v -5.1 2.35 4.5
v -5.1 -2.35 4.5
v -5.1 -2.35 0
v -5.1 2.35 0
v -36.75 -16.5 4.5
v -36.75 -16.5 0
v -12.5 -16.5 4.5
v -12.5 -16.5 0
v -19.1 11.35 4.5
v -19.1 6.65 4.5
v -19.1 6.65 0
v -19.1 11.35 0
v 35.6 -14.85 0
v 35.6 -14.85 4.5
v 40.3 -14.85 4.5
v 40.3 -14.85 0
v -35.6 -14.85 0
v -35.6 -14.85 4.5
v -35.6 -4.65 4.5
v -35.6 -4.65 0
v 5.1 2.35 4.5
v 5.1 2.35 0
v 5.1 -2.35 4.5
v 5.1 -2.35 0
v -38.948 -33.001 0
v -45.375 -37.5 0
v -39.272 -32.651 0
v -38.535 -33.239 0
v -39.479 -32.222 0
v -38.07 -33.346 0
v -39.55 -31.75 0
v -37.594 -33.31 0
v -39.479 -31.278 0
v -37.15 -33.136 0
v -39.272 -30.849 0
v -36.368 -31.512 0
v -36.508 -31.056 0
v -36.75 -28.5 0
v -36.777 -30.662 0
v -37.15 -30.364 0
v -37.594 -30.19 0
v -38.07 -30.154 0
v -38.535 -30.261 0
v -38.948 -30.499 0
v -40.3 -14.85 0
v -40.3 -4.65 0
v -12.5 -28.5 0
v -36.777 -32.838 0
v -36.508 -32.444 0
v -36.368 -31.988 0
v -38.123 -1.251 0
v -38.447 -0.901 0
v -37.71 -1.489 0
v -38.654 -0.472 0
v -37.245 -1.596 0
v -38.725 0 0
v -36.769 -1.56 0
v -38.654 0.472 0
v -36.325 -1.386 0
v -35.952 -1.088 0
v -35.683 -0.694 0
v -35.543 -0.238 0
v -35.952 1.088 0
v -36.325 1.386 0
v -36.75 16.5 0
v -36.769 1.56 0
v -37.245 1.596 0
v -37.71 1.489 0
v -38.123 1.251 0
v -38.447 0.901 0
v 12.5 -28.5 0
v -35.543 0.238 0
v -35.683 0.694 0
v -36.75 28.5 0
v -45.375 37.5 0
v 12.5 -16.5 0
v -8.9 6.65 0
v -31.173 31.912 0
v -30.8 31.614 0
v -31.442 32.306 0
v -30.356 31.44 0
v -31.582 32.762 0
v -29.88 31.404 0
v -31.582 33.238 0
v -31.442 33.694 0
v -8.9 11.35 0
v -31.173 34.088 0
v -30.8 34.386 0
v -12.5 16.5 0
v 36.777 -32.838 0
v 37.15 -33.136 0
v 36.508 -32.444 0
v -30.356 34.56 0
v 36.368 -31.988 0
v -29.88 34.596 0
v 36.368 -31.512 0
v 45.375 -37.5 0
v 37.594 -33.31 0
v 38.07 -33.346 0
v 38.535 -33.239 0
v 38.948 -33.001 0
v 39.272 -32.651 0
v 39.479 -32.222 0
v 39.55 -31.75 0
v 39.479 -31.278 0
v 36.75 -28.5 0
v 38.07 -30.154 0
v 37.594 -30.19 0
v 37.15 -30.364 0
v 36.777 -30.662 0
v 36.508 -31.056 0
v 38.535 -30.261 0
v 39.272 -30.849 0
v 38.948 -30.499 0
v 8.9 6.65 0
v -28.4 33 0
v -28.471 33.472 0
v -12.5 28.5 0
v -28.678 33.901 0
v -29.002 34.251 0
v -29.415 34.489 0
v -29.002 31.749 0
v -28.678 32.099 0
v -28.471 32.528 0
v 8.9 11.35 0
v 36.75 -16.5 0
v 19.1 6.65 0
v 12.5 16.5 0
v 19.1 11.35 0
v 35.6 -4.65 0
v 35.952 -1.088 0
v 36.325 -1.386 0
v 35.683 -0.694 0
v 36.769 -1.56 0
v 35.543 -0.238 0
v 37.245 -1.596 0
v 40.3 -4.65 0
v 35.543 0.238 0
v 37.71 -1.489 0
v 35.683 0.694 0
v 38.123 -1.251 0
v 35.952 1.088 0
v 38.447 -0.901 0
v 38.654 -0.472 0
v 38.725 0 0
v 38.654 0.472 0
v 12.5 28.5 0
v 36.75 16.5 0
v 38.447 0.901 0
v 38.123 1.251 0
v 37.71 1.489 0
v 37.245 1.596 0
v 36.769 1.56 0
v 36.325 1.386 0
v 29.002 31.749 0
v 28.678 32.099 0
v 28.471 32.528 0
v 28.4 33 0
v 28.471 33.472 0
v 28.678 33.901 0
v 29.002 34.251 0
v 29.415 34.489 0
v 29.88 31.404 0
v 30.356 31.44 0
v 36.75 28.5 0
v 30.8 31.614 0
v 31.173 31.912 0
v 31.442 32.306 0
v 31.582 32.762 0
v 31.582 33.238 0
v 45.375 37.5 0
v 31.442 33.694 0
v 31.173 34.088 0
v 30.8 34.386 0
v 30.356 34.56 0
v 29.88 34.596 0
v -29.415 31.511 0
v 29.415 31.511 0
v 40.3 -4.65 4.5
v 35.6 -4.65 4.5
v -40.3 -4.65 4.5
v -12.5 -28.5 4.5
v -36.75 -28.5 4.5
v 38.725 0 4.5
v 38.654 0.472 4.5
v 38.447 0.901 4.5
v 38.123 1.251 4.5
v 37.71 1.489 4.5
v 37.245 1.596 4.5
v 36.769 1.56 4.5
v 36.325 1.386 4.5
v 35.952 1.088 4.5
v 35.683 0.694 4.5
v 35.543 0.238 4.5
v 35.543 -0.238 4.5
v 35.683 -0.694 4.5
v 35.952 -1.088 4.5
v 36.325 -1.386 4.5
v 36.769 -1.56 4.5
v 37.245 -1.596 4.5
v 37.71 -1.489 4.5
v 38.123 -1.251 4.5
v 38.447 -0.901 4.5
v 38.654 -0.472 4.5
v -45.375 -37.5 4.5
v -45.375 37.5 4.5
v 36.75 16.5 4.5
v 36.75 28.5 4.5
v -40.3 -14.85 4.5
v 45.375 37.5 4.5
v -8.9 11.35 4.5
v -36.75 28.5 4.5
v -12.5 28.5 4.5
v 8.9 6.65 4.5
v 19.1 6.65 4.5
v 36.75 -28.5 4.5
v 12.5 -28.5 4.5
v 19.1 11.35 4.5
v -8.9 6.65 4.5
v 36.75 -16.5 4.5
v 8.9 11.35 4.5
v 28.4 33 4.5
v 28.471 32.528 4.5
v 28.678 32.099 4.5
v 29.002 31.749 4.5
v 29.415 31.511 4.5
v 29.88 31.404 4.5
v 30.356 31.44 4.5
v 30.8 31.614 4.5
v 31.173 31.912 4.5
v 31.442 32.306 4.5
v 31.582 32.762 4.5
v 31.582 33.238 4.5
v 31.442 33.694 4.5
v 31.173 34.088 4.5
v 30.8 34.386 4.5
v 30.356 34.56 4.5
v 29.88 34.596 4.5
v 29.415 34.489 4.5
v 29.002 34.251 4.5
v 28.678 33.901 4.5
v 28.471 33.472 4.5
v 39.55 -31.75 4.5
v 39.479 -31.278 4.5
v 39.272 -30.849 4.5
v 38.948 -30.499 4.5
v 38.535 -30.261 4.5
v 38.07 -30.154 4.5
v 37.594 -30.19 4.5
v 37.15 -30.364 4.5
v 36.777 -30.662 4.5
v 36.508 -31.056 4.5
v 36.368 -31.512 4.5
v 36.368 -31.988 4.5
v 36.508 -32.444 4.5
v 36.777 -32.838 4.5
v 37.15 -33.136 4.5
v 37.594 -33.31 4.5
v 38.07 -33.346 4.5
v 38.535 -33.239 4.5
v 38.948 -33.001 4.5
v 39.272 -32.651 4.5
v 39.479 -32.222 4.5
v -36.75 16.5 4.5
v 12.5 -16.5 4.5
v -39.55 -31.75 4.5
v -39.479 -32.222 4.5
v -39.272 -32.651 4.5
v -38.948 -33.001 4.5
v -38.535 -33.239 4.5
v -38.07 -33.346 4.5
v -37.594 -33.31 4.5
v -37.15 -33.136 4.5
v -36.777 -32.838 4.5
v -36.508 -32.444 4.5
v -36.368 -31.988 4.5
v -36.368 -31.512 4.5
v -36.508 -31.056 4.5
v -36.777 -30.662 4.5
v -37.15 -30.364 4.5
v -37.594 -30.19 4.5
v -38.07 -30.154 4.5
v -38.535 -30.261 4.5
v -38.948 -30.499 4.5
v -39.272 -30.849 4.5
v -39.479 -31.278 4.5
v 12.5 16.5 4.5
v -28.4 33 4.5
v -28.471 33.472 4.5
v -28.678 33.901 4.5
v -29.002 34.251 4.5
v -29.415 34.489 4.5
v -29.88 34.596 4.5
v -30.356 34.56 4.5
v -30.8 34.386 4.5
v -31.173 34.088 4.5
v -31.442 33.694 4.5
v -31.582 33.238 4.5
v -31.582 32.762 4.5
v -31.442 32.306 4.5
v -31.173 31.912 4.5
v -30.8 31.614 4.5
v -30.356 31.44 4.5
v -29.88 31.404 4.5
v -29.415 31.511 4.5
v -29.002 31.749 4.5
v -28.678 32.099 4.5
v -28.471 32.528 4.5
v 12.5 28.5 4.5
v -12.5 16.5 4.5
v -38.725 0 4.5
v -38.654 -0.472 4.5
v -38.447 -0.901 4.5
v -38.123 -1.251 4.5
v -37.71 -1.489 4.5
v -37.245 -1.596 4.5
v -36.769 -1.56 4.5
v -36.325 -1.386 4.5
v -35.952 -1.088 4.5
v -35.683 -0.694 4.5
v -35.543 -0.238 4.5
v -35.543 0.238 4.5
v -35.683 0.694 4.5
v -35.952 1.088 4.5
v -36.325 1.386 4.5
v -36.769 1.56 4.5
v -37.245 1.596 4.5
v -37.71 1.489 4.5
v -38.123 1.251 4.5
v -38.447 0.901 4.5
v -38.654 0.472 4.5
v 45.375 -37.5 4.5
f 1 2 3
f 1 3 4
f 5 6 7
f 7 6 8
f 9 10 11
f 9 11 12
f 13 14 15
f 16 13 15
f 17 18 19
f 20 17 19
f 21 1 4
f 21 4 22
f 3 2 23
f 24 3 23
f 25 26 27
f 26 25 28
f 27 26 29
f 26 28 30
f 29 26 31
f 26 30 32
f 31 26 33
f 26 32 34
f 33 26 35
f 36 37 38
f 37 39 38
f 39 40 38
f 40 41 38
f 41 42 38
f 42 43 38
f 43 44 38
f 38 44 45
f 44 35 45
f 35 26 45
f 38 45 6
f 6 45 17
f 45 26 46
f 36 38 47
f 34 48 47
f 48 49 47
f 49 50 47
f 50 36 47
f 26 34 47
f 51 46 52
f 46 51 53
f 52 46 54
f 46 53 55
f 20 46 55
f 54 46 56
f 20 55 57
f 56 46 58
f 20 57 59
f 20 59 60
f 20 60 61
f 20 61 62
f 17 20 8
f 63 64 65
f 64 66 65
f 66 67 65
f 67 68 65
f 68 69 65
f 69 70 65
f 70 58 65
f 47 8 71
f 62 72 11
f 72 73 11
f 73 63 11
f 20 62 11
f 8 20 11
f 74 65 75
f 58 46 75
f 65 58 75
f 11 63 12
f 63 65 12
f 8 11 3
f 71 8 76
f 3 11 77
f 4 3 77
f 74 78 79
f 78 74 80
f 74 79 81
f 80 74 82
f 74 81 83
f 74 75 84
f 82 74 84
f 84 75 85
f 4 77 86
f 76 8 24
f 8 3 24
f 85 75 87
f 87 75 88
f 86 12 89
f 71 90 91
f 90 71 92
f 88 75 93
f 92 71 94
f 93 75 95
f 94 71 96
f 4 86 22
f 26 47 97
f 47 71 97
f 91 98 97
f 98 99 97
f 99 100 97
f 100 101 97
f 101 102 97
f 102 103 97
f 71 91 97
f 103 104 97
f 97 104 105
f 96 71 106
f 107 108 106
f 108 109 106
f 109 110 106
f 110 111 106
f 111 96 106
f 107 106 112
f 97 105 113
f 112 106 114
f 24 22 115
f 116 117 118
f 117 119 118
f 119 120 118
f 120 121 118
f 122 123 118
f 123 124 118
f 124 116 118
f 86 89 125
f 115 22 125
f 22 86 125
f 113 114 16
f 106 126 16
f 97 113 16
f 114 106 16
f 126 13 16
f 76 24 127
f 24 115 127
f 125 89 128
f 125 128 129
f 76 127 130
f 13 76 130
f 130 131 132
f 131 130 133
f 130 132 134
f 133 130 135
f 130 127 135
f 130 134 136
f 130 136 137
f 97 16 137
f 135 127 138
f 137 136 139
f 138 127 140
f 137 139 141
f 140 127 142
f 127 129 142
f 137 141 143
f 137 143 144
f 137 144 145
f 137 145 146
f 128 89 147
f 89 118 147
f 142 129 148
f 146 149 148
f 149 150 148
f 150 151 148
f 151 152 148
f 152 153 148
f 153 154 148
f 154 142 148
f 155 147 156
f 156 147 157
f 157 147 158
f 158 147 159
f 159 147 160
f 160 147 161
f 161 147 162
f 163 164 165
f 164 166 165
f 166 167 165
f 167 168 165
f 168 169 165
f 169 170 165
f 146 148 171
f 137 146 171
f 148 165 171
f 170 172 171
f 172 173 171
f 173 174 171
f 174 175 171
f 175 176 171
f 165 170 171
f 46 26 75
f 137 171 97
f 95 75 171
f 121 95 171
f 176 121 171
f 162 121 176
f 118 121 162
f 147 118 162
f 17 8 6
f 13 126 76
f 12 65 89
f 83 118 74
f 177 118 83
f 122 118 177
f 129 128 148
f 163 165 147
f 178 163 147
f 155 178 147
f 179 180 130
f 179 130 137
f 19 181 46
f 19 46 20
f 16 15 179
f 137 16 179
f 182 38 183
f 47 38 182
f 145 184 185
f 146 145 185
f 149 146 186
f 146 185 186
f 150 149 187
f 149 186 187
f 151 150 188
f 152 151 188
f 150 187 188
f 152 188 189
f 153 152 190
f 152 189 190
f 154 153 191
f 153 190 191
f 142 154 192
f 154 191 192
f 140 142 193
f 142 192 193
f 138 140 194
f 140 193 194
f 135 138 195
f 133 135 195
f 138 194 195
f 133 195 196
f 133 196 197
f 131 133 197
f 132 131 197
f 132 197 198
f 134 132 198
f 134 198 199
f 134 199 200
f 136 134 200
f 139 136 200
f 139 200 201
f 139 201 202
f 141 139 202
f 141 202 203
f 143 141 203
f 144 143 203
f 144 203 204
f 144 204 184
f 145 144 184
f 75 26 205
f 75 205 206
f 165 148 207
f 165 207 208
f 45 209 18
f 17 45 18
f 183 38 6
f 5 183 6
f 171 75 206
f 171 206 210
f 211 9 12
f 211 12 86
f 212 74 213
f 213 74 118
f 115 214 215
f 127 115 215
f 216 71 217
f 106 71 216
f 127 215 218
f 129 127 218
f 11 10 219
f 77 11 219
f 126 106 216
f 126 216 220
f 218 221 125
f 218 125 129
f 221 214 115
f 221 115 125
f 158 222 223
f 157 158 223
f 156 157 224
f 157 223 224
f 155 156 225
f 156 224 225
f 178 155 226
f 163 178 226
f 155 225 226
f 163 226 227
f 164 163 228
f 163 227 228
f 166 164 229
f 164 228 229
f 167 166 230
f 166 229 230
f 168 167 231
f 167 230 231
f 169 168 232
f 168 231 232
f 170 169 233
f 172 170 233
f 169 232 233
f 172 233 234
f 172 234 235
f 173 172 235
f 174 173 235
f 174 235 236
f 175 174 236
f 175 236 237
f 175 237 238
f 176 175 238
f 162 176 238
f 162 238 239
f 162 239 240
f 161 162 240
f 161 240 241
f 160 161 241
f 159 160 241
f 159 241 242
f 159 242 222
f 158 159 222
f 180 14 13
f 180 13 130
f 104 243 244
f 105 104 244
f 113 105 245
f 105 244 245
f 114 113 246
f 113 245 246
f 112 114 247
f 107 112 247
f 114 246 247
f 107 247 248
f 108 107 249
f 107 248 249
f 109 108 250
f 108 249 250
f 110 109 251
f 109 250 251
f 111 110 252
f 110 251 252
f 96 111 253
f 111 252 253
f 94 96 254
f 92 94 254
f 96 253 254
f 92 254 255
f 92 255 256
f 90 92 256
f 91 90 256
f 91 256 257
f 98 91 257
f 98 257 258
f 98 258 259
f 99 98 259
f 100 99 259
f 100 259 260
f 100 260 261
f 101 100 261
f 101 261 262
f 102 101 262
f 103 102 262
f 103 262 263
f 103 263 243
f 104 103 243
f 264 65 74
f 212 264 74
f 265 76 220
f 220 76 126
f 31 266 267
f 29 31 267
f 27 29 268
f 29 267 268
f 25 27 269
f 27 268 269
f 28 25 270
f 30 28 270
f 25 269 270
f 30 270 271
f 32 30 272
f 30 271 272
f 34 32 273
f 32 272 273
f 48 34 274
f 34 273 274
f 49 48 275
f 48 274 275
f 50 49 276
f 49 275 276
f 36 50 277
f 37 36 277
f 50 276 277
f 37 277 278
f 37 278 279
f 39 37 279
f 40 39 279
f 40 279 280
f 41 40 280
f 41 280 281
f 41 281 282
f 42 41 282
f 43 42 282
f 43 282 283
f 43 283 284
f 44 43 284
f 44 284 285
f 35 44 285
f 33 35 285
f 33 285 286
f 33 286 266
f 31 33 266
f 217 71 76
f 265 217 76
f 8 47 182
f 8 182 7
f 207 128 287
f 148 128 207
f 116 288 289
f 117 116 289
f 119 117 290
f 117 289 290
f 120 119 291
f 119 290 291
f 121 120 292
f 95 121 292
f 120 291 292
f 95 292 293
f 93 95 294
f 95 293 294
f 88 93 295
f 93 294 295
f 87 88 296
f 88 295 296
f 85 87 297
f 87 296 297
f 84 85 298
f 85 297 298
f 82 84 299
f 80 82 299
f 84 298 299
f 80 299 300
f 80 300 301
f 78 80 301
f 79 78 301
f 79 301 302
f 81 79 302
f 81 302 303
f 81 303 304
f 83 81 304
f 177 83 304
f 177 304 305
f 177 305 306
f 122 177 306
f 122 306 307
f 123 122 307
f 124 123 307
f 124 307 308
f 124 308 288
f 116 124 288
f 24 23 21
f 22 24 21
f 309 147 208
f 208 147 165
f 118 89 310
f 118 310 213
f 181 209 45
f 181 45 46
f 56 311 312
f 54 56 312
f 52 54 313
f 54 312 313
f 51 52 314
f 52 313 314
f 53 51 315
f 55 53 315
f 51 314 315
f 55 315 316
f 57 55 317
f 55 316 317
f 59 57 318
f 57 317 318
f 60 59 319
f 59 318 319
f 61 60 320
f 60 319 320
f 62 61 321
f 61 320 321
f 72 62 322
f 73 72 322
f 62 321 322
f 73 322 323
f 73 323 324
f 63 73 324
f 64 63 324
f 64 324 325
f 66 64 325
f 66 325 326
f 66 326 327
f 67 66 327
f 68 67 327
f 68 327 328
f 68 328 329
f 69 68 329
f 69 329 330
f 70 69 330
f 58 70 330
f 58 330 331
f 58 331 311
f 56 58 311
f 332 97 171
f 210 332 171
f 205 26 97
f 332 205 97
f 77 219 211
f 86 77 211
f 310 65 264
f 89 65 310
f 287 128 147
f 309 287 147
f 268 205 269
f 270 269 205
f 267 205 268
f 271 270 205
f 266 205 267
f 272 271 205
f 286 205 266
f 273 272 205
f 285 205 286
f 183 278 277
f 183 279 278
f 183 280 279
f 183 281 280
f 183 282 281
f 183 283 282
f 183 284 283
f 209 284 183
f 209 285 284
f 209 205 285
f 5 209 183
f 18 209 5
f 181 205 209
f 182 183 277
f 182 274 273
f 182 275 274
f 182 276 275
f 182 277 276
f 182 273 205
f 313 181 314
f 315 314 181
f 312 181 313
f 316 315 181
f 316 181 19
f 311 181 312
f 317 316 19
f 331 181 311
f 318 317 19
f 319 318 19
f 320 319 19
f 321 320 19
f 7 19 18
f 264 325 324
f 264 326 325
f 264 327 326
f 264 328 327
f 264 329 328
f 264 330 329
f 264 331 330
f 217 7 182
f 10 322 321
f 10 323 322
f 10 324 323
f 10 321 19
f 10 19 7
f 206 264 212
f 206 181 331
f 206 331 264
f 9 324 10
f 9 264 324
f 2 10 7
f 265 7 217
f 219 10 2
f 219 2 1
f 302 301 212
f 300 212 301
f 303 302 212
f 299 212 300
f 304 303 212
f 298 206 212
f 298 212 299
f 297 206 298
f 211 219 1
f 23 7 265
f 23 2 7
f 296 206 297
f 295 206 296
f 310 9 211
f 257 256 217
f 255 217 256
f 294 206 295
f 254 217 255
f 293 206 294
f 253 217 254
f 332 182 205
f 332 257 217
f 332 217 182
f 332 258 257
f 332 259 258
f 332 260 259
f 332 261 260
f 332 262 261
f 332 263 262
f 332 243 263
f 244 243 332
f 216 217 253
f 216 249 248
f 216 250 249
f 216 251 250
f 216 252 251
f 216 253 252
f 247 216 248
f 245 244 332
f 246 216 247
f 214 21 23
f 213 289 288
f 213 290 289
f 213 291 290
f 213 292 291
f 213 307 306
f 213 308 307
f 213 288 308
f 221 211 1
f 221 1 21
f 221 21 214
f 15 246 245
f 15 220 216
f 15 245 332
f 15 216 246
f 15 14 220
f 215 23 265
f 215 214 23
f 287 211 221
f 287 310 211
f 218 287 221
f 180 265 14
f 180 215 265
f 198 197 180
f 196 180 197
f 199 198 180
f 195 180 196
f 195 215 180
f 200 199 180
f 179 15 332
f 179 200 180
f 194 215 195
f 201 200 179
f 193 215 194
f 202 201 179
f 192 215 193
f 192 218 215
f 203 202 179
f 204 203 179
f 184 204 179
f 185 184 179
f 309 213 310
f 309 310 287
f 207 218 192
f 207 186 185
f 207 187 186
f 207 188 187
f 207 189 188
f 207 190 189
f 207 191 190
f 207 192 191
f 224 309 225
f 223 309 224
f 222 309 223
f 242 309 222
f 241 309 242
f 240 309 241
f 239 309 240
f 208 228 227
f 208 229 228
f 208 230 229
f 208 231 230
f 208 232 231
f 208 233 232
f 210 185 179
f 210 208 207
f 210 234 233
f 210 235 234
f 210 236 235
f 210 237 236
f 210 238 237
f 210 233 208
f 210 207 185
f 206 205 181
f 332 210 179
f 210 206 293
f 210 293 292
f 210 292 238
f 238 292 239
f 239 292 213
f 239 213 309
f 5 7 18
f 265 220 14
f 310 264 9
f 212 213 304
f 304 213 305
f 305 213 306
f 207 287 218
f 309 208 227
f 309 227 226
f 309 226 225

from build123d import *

# Parameters (mm, degrees)
SKETCH1_W           = 90.75
SKETCH1_H           = 75
SKETCH1_W_2         = 24.25
SKETCH1_H_2         = 12
BOSS_EXTRUDE1_DEPTH = 4.5
SKETCH2_R           = 1.6
SCREWHOLES_DEPTH    = 60.037196961
SKETCH3_W           = 10.2
SKETCH3_H           = 4.7
BELTCLAMP_DEPTH     = 60.037196961
SKETCH4_W           = 10.2
SKETCH4_H           = 4.7
CUT_EXTRUDE3_DEPTH  = 60.037196961
SKETCH5_R           = 1.6
SKETCH5_W           = 4.7
SKETCH5_H           = 10.2
CUT_EXTRUDE4_DEPTH  = 60.037196961


with BuildPart() as part:
    # Sketch1 → Boss-Extrude1 (new body)
    with BuildSketch(Plane.XY):
        Rectangle(SKETCH1_W, SKETCH1_H)
        with Locations((-24.625, 22.5)):
            Rectangle(SKETCH1_W_2, SKETCH1_H_2, mode=Mode.SUBTRACT)
        with Locations((24.625, 22.5)):
            Rectangle(SKETCH1_W_2, SKETCH1_H_2, mode=Mode.SUBTRACT)
        with Locations((24.625, -22.5)):
            Rectangle(SKETCH1_W_2, SKETCH1_H_2, mode=Mode.SUBTRACT)
        with Locations((-24.625, -22.5)):
            Rectangle(SKETCH1_W_2, SKETCH1_H_2, mode=Mode.SUBTRACT)
    extrude(amount=BOSS_EXTRUDE1_DEPTH)

    # Sketch2 → screwHoles (cut, through all)
    with BuildSketch(Plane.XY.offset(4.5)):
        with Locations((-30, 33)):
            Circle(SKETCH2_R)
        with Locations(Location((30, 33, 0), (0, 0, 180))):
            Circle(SKETCH2_R)
        with Locations((37.125, 0)):
            Circle(SKETCH2_R)
        with Locations(Location((-37.125, 0, 0), (0, 0, 180))):
            Circle(SKETCH2_R)
    extrude(amount=-SCREWHOLES_DEPTH, mode=Mode.SUBTRACT)

    # Sketch3 → BeltClamp (cut, through all)
    with BuildSketch(Plane.XY.offset(4.5)):
        with Locations((-14, 9)):
            Rectangle(SKETCH3_W, SKETCH3_H)
        with Locations((14, 9)):
            Rectangle(SKETCH3_W, SKETCH3_H)
    extrude(amount=-BELTCLAMP_DEPTH, mode=Mode.SUBTRACT)

    # Sketch4 → Cut-Extrude3 (cut, through all)
    with BuildSketch(Plane.XY.offset(4.5)):
        Rectangle(SKETCH4_W, SKETCH4_H)
    extrude(amount=-CUT_EXTRUDE3_DEPTH, mode=Mode.SUBTRACT)

    # Sketch5 → Cut-Extrude4 (cut, through all)
    with BuildSketch(Plane.XY.offset(4.5)):
        with Locations((37.95, -31.75)):
            Circle(SKETCH5_R)
        with Locations(Location((-37.95, -31.75, 0), (0, 0, 180))):
            Circle(SKETCH5_R)
        with Locations((37.95, -9.75)):
            Rectangle(SKETCH5_W, SKETCH5_H)
        with Locations((-37.95, -9.75)):
            Rectangle(SKETCH5_W, SKETCH5_H)
    extrude(amount=-CUT_EXTRUDE4_DEPTH, mode=Mode.SUBTRACT)


solid = part.part
